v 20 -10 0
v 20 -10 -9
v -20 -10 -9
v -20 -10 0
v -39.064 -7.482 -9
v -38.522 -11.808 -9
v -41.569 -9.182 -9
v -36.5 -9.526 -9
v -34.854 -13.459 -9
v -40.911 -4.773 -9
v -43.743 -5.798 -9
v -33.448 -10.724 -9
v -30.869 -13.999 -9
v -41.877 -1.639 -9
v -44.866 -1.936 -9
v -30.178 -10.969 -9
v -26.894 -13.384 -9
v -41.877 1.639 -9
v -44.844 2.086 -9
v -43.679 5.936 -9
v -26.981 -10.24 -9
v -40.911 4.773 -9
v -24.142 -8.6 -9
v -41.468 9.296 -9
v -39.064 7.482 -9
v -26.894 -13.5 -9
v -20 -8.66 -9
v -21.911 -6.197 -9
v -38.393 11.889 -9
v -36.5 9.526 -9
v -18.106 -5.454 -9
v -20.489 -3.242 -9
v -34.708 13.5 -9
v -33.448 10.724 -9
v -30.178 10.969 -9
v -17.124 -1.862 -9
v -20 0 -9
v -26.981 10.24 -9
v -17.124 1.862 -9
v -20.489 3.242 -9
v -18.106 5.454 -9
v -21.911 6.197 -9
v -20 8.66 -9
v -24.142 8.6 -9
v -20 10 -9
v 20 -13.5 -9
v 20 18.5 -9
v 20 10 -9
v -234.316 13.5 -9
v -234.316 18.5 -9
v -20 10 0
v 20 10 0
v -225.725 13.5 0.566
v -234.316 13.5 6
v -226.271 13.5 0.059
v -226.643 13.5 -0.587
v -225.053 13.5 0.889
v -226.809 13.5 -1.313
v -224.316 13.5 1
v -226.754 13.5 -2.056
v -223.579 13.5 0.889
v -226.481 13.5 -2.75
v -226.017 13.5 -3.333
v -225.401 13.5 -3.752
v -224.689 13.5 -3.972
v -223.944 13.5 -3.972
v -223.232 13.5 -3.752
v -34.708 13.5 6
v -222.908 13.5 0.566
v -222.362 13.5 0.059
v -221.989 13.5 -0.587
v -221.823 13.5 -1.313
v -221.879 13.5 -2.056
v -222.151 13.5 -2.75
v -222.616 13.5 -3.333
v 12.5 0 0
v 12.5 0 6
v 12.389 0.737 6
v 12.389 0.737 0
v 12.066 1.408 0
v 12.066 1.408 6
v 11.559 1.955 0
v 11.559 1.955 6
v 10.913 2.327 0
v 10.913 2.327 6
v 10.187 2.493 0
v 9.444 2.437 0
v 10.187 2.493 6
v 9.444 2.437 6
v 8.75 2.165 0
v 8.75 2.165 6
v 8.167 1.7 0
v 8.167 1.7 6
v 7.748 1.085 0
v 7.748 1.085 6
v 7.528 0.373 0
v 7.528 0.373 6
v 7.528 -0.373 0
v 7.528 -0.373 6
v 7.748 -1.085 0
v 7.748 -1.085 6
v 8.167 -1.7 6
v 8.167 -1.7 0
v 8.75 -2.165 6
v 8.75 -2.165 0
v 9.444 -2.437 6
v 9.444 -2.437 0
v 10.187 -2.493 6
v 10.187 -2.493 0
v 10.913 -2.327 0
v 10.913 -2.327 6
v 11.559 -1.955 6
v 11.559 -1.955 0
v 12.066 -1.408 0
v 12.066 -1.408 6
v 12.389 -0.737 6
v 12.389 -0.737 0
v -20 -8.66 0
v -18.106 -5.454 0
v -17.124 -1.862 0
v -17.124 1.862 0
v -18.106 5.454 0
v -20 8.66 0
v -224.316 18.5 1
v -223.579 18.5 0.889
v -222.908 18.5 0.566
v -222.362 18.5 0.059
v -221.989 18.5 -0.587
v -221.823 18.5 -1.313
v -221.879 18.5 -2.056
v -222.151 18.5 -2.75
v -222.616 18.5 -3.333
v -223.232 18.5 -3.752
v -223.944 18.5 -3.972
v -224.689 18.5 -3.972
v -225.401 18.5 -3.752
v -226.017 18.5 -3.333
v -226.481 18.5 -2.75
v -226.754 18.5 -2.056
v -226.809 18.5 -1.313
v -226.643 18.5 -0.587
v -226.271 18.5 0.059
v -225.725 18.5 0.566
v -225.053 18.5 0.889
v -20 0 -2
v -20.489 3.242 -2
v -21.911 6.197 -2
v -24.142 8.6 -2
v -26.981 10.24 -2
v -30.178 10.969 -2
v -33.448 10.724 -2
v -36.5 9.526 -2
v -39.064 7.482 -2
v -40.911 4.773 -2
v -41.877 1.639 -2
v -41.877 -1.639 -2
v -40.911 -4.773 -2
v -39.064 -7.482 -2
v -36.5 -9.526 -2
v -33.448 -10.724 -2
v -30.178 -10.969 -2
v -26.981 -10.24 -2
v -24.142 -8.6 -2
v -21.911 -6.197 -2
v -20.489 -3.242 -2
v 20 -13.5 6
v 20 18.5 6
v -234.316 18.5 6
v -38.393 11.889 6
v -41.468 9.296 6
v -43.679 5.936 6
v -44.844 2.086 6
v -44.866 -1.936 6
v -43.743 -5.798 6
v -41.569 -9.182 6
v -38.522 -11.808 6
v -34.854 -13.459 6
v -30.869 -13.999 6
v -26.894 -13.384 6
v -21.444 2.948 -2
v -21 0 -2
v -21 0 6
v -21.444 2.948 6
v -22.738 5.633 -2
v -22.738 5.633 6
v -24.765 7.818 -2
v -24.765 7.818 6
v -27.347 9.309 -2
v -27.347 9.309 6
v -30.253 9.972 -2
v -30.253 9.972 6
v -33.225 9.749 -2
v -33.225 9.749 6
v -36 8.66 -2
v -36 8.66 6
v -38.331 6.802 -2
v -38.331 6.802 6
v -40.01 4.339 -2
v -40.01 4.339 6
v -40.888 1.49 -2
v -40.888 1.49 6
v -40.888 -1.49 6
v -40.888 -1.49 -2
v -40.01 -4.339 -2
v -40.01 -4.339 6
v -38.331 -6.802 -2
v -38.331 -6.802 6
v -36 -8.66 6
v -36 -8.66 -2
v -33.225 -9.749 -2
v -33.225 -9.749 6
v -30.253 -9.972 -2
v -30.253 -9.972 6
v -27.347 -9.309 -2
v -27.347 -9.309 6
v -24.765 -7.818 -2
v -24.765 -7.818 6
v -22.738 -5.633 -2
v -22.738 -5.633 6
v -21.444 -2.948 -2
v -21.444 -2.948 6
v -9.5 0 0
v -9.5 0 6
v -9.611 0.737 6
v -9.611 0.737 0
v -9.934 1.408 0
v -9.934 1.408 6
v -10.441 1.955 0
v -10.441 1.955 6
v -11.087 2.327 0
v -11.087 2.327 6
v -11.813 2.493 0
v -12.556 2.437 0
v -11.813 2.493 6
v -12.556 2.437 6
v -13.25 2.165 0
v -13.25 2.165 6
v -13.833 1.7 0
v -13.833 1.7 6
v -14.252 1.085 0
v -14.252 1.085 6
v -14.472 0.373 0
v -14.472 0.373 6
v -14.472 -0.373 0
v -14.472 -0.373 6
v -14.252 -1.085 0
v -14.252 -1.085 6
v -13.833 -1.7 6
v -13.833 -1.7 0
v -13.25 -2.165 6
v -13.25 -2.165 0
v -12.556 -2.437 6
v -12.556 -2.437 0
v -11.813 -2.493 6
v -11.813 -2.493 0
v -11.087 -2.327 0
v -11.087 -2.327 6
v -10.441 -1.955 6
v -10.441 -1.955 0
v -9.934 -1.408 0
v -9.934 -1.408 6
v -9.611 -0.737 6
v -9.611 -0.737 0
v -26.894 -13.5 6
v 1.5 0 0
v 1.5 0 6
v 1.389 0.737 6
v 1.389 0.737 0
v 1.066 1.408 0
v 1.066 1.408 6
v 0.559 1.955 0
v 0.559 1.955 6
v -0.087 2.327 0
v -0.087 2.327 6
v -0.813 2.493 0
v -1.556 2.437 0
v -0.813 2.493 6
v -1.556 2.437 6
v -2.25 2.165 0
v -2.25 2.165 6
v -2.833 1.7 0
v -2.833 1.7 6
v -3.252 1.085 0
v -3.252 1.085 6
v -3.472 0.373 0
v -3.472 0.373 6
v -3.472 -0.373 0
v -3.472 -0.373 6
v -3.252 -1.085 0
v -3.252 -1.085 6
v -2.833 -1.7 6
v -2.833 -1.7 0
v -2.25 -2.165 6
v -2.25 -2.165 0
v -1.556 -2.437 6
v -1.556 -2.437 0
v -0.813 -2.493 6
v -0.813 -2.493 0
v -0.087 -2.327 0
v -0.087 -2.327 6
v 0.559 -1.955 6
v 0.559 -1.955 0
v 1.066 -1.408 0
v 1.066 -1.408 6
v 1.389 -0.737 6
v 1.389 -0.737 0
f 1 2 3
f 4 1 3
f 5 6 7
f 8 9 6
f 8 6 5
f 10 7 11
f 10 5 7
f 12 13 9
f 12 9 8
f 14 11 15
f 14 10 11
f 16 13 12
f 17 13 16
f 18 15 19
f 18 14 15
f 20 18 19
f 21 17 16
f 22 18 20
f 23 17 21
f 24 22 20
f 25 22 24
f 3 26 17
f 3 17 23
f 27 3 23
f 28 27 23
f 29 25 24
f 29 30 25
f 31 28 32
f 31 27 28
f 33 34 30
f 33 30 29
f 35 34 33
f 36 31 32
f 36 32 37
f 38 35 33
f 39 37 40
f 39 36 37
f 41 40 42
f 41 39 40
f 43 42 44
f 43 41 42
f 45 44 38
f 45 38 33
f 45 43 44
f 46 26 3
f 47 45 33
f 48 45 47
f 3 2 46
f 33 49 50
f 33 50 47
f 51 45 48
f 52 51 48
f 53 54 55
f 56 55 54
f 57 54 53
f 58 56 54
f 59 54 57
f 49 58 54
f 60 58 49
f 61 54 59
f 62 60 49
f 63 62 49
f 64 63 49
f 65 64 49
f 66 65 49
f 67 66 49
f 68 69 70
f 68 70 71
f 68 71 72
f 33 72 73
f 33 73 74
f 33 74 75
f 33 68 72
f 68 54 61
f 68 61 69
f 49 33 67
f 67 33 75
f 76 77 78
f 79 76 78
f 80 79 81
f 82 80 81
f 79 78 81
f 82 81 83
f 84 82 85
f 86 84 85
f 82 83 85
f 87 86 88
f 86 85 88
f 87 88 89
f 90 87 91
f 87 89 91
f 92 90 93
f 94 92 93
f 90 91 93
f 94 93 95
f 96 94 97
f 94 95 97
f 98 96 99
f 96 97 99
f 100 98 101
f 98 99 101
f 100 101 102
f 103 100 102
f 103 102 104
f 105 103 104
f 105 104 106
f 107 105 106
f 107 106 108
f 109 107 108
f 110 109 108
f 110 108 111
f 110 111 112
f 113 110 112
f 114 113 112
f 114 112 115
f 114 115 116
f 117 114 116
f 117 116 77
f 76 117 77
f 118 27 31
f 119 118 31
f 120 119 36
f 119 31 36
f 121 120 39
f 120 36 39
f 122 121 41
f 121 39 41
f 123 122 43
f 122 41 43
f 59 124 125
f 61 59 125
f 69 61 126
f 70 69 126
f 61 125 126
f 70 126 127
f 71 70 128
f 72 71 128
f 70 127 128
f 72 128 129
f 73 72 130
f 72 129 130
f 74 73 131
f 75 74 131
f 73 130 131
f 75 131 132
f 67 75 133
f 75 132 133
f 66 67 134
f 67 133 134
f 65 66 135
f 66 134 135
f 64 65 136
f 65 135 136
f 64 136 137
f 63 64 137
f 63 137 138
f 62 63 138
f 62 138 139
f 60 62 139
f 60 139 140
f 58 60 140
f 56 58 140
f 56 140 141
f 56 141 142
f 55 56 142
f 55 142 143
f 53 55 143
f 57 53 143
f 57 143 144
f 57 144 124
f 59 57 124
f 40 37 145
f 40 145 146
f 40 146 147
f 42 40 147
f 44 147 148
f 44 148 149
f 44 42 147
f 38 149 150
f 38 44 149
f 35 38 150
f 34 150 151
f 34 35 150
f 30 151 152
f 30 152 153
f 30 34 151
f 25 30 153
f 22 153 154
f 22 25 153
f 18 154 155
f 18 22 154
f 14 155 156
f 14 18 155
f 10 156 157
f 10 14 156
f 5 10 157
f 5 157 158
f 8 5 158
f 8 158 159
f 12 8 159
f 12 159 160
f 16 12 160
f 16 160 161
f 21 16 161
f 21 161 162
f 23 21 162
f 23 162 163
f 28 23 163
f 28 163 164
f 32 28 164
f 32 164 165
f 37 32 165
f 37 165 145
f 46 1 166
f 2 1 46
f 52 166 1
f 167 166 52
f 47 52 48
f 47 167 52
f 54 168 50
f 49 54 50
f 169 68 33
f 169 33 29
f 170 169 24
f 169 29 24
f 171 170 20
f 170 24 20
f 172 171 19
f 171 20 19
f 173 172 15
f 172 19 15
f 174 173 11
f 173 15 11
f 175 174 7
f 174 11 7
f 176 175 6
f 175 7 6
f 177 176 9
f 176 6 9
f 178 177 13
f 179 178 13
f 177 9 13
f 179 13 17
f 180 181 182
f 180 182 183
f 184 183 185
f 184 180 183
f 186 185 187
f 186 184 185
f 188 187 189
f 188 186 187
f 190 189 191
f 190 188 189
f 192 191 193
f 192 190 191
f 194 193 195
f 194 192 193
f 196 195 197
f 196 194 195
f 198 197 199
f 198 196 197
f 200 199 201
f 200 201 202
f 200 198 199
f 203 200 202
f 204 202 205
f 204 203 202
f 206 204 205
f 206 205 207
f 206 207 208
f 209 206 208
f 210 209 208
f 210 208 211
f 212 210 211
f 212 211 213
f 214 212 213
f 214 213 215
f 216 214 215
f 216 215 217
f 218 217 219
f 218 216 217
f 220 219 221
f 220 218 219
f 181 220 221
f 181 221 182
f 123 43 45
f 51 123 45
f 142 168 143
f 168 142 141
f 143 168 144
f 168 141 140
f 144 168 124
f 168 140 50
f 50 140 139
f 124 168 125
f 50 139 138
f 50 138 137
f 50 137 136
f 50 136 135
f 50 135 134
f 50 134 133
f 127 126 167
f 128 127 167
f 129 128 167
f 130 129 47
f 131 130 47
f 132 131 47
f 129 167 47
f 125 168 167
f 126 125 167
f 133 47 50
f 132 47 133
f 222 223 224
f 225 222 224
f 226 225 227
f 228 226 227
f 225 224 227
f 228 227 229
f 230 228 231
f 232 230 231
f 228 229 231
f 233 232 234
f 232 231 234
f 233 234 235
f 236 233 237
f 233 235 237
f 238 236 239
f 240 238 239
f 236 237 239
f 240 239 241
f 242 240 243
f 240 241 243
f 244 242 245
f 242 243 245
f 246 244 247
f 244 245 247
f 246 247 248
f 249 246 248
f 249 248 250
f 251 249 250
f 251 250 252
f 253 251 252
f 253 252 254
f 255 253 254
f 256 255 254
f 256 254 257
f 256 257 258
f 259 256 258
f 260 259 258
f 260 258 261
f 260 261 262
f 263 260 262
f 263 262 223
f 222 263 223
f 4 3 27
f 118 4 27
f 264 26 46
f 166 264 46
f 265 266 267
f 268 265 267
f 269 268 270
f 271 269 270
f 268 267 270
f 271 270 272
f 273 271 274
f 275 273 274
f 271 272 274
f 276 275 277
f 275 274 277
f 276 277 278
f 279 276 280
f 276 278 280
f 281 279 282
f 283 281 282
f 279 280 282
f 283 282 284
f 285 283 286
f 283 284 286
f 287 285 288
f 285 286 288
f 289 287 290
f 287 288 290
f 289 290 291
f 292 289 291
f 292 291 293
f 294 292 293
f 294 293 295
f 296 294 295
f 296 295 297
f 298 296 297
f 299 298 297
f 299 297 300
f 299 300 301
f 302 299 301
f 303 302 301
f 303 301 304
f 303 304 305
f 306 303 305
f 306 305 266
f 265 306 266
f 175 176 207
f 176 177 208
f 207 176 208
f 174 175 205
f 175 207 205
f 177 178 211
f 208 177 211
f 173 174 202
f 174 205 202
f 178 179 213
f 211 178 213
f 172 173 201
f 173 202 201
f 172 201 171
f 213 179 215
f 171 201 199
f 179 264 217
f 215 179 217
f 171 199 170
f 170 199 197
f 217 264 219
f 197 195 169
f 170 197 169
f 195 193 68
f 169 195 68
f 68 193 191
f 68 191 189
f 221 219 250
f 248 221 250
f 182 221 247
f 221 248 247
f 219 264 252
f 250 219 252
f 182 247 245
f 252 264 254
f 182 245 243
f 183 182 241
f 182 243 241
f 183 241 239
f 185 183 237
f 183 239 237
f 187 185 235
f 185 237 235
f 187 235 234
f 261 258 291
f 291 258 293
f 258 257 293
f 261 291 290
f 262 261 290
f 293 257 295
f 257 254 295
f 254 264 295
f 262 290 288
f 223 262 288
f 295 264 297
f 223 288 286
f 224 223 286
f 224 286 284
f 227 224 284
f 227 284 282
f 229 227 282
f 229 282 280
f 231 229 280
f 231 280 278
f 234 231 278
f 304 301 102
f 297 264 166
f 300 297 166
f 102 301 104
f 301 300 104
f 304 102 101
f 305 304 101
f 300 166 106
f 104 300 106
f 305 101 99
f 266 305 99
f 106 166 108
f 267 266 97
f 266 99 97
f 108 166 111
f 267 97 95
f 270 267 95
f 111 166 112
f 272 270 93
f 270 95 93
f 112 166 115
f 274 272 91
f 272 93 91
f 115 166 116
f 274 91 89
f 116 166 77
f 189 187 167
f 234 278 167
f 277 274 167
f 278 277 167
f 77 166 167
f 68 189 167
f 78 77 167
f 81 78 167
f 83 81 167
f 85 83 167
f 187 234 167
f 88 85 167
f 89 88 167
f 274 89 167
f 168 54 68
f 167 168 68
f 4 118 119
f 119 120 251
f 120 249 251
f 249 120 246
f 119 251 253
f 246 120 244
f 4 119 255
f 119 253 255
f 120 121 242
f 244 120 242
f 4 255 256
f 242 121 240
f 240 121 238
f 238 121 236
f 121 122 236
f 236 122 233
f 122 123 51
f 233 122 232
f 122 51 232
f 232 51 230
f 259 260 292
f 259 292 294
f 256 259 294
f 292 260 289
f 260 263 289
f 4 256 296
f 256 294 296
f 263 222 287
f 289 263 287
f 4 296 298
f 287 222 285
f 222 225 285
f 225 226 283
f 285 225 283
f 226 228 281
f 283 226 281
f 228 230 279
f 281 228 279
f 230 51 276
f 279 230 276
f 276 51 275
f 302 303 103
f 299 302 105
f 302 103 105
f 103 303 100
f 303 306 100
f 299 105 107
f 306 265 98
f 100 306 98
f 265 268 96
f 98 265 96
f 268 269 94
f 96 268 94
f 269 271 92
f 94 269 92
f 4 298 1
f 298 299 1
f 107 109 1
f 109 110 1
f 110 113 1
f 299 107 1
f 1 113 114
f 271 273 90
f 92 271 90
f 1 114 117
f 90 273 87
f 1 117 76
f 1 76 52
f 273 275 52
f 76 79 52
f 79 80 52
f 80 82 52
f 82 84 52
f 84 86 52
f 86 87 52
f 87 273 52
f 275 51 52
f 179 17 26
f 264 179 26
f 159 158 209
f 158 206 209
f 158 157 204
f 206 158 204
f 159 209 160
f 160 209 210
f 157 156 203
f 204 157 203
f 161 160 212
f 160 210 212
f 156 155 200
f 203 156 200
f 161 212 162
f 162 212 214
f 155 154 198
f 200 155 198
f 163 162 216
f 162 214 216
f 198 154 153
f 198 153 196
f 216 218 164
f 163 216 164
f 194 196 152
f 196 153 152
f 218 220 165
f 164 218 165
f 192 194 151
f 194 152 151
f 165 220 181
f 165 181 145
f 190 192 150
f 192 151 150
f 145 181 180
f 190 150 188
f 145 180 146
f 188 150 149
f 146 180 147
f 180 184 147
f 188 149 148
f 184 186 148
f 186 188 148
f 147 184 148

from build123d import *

# Parameters (mm, degrees)
SKETCH_1_W          = 40
SKETCH_1_H          = 20
EXTRUDE_1_DEPTH     = 6
SKETCH_2_R          = 2.5
CUT_EXTRUDE_1_DEPTH = 24.151673806
EXTRUDE_START       = -15
EXTRUDE_2_OUTLINE_R = 11
EXTRUDE_2_DEPTH     = 15
EXTRUDE_START_2     = -8
SKETCH_5_R          = 11
SKETCH_5_R_2        = 10
EXTRUDE_3_DEPTH     = 8
SKETCH_8_W          = 15
SKETCH_8_H          = 5
EXTRUDE_4_DEPTH     = 500
SKETCH_9_W          = 4.037306924
SKETCH_9_H          = 3.364422437
EXTRUDE_5_DEPTH     = 15
SKETCH_11_W         = 261.320344598
SKETCH_11_H         = 37.265148186
CUT_EXTRUDE_2_DEPTH = 482.183177179
SKETCH_12_R         = 2.5
CUT_EXTRUDE_3_DEPTH = 237.730557242


# Read off the part's stored shape, not the designer's step: 凸台-拉伸2
with BuildPart() as part:
    # 草图1 → 凸台-拉伸1 (new body)
    with BuildSketch(Plane.XY):
        Rectangle(SKETCH_1_W, SKETCH_1_H)
    extrude(amount=EXTRUDE_1_DEPTH)

    # 草图2 → 切除-拉伸1 (cut, through all)
    with BuildSketch(Plane.XY.offset(6)):
        with Locations((10, 0)):
            Circle(SKETCH_2_R)
        with Locations((-1, 0)):
            Circle(SKETCH_2_R)
        with Locations((-12, 0)):
            Circle(SKETCH_2_R)
    extrude(amount=-CUT_EXTRUDE_1_DEPTH, mode=Mode.SUBTRACT)

    # 凸台-拉伸2 outline → 凸台-拉伸2 (add)
    with BuildSketch(Plane.XY.offset(6).offset(EXTRUDE_START)):
        with BuildLine():
            Line((20, 10), (20, 13.5))
            Line((20, 13.5), (-26.893967141, 13.5))
            Line((-26.893967141, 13.5), (-26.893967141, 13.384337644))
            ThreePointArc((-26.893967141, 13.384337644), (-45, 0), (-26.893967141, -13.384337644))
            Line((-26.893967141, -13.384337644), (-26.893967141, -13.5))
            Line((-26.893967141, -13.5), (20, -13.5))
            Line((20, -13.5), (20, -10))
            Line((20, -10), (-20, -10))
            Line((-20, -10), (-20, -8.660254038))
            ThreePointArc((-20, -8.660254038), (-17, 0), (-20, 8.660254038))
            Line((-20, 8.660254038), (-20, 10))
            Line((-20, 10), (20, 10))
        make_face()
        with Locations((-31, 0)):
            Circle(EXTRUDE_2_OUTLINE_R, mode=Mode.SUBTRACT)
    extrude(amount=EXTRUDE_2_DEPTH)

    # 草图5 → 凸台-拉伸3 (add)
    with BuildSketch(Plane.XY.offset(6).offset(EXTRUDE_START_2)):
        with Locations((-31, 0)):
            Circle(SKETCH_5_R)
        with Locations((-31, 0)):
            Circle(SKETCH_5_R_2, mode=Mode.SUBTRACT)
    extrude(amount=EXTRUDE_3_DEPTH)

    # 草图8 → 凸台-拉伸4 (add)
    with BuildSketch(Plane(origin=(20, 0, 0), x_dir=(0, 0, -1), z_dir=(1, 0, 0))):
        with Locations((1.5, 16)):
            Rectangle(SKETCH_8_W, SKETCH_8_H)
    extrude(amount=-EXTRUDE_4_DEPTH)

    # 草图9 → 凸台-拉伸5 (add, through all)
    with BuildSketch(Plane(origin=(0, 0, -9), x_dir=(-1, 0, 0), z_dir=(0, 0, -1))):
        with Locations((26.475334378, 14.151164675)):
            Rectangle(SKETCH_9_W, SKETCH_9_H)
    extrude(amount=-EXTRUDE_5_DEPTH)

    # 草图11 → 切除-拉伸2 (cut, through all)
    with BuildSketch(Plane(origin=(0, 18.5, 0), x_dir=(1, 0, 0), z_dir=(0, 1, 0))):
        with Locations((-364.976425965, 6.732710128)):
            Rectangle(SKETCH_11_W, SKETCH_11_H)
    extrude(amount=-CUT_EXTRUDE_2_DEPTH, mode=Mode.SUBTRACT)

    # 草图12 → 切除-拉伸3 (cut, through all)
    with BuildSketch(Plane(origin=(0, 18.5, 0), x_dir=(1, 0, 0), z_dir=(0, 1, 0))):
        with Locations(Location((-224.316253666, 1.5, 0), (0, 0, 270))):
            Circle(SKETCH_12_R)
    extrude(amount=-CUT_EXTRUDE_3_DEPTH, mode=Mode.SUBTRACT)


solid = part.part
